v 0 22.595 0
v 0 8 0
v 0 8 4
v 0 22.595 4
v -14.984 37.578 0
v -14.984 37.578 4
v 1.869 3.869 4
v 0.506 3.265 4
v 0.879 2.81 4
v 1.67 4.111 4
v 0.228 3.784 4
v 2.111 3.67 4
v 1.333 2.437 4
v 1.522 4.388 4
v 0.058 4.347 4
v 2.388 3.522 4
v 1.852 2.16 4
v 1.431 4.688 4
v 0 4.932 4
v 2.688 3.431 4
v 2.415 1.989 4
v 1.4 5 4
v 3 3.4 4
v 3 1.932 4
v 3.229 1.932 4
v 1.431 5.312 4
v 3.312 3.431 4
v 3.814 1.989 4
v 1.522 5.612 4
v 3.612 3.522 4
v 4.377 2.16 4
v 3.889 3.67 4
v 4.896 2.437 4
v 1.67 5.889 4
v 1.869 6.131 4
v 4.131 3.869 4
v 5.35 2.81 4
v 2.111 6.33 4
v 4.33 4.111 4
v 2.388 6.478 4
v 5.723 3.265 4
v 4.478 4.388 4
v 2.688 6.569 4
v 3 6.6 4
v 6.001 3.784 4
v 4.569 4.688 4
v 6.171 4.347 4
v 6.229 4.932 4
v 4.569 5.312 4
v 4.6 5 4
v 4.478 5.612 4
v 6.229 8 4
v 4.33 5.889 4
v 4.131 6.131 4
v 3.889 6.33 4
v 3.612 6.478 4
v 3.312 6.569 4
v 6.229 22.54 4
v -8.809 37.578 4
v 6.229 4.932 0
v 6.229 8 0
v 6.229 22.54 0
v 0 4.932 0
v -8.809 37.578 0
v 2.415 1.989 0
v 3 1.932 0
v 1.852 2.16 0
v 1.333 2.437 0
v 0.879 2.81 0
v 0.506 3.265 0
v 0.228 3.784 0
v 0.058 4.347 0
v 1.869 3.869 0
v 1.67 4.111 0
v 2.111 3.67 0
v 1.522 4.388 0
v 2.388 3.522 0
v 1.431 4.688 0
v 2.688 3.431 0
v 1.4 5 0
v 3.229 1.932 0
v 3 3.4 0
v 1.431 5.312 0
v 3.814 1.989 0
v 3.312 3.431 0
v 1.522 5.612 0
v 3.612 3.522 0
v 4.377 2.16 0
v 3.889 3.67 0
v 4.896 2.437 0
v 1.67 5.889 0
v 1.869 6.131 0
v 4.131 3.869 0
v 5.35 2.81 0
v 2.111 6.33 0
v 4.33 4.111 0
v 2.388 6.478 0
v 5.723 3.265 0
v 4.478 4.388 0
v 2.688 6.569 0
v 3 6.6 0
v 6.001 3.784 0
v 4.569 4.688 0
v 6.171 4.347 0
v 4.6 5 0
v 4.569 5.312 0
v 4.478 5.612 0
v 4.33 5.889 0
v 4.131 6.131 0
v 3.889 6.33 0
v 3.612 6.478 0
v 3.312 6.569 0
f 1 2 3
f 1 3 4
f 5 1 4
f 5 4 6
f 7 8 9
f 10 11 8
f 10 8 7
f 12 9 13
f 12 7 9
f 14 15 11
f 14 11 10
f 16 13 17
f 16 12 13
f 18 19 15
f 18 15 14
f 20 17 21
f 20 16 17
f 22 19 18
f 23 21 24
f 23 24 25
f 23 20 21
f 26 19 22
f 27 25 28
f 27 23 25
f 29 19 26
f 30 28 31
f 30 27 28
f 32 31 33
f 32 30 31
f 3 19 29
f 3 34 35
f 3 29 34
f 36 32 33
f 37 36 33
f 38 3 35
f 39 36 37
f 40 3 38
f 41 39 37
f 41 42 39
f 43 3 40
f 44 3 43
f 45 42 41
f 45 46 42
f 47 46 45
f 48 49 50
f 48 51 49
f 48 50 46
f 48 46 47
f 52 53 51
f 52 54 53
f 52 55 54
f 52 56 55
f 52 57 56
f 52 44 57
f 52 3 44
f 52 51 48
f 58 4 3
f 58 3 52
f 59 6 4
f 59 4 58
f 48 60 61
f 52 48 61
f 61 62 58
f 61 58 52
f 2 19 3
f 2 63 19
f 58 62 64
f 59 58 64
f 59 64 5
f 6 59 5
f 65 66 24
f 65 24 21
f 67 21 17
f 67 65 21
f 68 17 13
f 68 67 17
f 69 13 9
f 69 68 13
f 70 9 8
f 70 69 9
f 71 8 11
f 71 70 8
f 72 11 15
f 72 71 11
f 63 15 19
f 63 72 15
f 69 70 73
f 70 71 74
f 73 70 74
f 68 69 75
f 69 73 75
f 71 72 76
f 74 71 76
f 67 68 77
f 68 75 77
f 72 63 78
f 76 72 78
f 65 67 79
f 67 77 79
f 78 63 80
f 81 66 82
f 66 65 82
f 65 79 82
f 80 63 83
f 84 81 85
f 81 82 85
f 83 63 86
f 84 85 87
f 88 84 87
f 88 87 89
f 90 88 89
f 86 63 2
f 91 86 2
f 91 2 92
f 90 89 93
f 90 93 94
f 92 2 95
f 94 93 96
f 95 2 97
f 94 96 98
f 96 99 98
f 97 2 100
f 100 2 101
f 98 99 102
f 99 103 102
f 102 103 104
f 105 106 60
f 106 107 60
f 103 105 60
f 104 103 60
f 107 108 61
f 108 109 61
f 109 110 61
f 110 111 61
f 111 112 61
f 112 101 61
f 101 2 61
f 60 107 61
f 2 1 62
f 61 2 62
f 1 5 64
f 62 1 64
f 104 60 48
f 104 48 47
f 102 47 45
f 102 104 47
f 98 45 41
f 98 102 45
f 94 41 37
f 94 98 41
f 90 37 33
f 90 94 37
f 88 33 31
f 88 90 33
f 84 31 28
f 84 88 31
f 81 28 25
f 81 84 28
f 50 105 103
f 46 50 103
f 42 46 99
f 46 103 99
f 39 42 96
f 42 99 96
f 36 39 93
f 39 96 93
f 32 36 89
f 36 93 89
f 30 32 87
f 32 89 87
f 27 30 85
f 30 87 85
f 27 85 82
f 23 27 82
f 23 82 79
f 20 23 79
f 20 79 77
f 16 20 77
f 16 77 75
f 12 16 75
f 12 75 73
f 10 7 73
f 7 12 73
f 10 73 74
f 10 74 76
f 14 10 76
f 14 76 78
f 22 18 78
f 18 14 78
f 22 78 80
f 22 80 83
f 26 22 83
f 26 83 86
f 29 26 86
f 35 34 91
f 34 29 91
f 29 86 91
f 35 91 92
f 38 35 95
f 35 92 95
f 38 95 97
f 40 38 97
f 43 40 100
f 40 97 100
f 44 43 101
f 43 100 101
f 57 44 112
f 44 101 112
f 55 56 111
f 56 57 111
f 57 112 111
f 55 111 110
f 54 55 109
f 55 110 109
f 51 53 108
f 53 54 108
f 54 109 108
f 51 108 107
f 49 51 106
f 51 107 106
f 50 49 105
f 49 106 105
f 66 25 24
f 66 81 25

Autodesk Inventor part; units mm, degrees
ref_plane "YZ Plane" through (0, 0, 0) normal (1, 0, 0) x (0, 1, 0)
ref_plane "XZ Plane" through (0, 0, 0) normal (0, 1, 0) x (-1, 0, 0)
ref_plane "XY Plane" through (0, 0, 0) normal (0, 0, 1) x (1, 0, 0)
sketch "Szkic1" plane through (0, 0, 0) normal (0, 0, 1) x (1, 0, 0)
  circle A0 centre (3, 5) radius 1.45 projected
  circle A1 centre (3, 5) radius 1.6
  line L0 (6.229, 0) -> (6.229, 8) projected
  line L1 (0, 0) -> (0, 8) projected
  line L2 (3.229, 1.9318) -> (3, 1.9318)
  line L3 (0, 4.9318) -> (0, 22.5946)
  line L4 (6.229, 22.5402) -> (6.229, 4.9318)
  arc A2 (3.229, 1.9318) -> (6.229, 4.9318) centre (3.229, 4.9318) ccw
  arc A3 (0, 4.9318) -> (3, 1.9318) centre (3, 4.9318) ccw
  line L5 (0, 22.5946) -> (-14.9838, 37.5785)
  line L6 (6.229, 22.5402) -> (-8.8092, 37.5785)
  line L7 (-8.8092, 37.5785) -> (-14.9838, 37.5785)
  point P0 (6.229, 1.9318)
  dimension "d0" = 3.2
  dimension "d1" = 3
  dimension "d2" = 135
extrude "Wyciągnięcie proste1" add sketch "Szkic1" along normal blind 4 contours A2 L2 A3 L1 L3 L5 L7 L6 L4 L0
properties part number "mirror_holder"
